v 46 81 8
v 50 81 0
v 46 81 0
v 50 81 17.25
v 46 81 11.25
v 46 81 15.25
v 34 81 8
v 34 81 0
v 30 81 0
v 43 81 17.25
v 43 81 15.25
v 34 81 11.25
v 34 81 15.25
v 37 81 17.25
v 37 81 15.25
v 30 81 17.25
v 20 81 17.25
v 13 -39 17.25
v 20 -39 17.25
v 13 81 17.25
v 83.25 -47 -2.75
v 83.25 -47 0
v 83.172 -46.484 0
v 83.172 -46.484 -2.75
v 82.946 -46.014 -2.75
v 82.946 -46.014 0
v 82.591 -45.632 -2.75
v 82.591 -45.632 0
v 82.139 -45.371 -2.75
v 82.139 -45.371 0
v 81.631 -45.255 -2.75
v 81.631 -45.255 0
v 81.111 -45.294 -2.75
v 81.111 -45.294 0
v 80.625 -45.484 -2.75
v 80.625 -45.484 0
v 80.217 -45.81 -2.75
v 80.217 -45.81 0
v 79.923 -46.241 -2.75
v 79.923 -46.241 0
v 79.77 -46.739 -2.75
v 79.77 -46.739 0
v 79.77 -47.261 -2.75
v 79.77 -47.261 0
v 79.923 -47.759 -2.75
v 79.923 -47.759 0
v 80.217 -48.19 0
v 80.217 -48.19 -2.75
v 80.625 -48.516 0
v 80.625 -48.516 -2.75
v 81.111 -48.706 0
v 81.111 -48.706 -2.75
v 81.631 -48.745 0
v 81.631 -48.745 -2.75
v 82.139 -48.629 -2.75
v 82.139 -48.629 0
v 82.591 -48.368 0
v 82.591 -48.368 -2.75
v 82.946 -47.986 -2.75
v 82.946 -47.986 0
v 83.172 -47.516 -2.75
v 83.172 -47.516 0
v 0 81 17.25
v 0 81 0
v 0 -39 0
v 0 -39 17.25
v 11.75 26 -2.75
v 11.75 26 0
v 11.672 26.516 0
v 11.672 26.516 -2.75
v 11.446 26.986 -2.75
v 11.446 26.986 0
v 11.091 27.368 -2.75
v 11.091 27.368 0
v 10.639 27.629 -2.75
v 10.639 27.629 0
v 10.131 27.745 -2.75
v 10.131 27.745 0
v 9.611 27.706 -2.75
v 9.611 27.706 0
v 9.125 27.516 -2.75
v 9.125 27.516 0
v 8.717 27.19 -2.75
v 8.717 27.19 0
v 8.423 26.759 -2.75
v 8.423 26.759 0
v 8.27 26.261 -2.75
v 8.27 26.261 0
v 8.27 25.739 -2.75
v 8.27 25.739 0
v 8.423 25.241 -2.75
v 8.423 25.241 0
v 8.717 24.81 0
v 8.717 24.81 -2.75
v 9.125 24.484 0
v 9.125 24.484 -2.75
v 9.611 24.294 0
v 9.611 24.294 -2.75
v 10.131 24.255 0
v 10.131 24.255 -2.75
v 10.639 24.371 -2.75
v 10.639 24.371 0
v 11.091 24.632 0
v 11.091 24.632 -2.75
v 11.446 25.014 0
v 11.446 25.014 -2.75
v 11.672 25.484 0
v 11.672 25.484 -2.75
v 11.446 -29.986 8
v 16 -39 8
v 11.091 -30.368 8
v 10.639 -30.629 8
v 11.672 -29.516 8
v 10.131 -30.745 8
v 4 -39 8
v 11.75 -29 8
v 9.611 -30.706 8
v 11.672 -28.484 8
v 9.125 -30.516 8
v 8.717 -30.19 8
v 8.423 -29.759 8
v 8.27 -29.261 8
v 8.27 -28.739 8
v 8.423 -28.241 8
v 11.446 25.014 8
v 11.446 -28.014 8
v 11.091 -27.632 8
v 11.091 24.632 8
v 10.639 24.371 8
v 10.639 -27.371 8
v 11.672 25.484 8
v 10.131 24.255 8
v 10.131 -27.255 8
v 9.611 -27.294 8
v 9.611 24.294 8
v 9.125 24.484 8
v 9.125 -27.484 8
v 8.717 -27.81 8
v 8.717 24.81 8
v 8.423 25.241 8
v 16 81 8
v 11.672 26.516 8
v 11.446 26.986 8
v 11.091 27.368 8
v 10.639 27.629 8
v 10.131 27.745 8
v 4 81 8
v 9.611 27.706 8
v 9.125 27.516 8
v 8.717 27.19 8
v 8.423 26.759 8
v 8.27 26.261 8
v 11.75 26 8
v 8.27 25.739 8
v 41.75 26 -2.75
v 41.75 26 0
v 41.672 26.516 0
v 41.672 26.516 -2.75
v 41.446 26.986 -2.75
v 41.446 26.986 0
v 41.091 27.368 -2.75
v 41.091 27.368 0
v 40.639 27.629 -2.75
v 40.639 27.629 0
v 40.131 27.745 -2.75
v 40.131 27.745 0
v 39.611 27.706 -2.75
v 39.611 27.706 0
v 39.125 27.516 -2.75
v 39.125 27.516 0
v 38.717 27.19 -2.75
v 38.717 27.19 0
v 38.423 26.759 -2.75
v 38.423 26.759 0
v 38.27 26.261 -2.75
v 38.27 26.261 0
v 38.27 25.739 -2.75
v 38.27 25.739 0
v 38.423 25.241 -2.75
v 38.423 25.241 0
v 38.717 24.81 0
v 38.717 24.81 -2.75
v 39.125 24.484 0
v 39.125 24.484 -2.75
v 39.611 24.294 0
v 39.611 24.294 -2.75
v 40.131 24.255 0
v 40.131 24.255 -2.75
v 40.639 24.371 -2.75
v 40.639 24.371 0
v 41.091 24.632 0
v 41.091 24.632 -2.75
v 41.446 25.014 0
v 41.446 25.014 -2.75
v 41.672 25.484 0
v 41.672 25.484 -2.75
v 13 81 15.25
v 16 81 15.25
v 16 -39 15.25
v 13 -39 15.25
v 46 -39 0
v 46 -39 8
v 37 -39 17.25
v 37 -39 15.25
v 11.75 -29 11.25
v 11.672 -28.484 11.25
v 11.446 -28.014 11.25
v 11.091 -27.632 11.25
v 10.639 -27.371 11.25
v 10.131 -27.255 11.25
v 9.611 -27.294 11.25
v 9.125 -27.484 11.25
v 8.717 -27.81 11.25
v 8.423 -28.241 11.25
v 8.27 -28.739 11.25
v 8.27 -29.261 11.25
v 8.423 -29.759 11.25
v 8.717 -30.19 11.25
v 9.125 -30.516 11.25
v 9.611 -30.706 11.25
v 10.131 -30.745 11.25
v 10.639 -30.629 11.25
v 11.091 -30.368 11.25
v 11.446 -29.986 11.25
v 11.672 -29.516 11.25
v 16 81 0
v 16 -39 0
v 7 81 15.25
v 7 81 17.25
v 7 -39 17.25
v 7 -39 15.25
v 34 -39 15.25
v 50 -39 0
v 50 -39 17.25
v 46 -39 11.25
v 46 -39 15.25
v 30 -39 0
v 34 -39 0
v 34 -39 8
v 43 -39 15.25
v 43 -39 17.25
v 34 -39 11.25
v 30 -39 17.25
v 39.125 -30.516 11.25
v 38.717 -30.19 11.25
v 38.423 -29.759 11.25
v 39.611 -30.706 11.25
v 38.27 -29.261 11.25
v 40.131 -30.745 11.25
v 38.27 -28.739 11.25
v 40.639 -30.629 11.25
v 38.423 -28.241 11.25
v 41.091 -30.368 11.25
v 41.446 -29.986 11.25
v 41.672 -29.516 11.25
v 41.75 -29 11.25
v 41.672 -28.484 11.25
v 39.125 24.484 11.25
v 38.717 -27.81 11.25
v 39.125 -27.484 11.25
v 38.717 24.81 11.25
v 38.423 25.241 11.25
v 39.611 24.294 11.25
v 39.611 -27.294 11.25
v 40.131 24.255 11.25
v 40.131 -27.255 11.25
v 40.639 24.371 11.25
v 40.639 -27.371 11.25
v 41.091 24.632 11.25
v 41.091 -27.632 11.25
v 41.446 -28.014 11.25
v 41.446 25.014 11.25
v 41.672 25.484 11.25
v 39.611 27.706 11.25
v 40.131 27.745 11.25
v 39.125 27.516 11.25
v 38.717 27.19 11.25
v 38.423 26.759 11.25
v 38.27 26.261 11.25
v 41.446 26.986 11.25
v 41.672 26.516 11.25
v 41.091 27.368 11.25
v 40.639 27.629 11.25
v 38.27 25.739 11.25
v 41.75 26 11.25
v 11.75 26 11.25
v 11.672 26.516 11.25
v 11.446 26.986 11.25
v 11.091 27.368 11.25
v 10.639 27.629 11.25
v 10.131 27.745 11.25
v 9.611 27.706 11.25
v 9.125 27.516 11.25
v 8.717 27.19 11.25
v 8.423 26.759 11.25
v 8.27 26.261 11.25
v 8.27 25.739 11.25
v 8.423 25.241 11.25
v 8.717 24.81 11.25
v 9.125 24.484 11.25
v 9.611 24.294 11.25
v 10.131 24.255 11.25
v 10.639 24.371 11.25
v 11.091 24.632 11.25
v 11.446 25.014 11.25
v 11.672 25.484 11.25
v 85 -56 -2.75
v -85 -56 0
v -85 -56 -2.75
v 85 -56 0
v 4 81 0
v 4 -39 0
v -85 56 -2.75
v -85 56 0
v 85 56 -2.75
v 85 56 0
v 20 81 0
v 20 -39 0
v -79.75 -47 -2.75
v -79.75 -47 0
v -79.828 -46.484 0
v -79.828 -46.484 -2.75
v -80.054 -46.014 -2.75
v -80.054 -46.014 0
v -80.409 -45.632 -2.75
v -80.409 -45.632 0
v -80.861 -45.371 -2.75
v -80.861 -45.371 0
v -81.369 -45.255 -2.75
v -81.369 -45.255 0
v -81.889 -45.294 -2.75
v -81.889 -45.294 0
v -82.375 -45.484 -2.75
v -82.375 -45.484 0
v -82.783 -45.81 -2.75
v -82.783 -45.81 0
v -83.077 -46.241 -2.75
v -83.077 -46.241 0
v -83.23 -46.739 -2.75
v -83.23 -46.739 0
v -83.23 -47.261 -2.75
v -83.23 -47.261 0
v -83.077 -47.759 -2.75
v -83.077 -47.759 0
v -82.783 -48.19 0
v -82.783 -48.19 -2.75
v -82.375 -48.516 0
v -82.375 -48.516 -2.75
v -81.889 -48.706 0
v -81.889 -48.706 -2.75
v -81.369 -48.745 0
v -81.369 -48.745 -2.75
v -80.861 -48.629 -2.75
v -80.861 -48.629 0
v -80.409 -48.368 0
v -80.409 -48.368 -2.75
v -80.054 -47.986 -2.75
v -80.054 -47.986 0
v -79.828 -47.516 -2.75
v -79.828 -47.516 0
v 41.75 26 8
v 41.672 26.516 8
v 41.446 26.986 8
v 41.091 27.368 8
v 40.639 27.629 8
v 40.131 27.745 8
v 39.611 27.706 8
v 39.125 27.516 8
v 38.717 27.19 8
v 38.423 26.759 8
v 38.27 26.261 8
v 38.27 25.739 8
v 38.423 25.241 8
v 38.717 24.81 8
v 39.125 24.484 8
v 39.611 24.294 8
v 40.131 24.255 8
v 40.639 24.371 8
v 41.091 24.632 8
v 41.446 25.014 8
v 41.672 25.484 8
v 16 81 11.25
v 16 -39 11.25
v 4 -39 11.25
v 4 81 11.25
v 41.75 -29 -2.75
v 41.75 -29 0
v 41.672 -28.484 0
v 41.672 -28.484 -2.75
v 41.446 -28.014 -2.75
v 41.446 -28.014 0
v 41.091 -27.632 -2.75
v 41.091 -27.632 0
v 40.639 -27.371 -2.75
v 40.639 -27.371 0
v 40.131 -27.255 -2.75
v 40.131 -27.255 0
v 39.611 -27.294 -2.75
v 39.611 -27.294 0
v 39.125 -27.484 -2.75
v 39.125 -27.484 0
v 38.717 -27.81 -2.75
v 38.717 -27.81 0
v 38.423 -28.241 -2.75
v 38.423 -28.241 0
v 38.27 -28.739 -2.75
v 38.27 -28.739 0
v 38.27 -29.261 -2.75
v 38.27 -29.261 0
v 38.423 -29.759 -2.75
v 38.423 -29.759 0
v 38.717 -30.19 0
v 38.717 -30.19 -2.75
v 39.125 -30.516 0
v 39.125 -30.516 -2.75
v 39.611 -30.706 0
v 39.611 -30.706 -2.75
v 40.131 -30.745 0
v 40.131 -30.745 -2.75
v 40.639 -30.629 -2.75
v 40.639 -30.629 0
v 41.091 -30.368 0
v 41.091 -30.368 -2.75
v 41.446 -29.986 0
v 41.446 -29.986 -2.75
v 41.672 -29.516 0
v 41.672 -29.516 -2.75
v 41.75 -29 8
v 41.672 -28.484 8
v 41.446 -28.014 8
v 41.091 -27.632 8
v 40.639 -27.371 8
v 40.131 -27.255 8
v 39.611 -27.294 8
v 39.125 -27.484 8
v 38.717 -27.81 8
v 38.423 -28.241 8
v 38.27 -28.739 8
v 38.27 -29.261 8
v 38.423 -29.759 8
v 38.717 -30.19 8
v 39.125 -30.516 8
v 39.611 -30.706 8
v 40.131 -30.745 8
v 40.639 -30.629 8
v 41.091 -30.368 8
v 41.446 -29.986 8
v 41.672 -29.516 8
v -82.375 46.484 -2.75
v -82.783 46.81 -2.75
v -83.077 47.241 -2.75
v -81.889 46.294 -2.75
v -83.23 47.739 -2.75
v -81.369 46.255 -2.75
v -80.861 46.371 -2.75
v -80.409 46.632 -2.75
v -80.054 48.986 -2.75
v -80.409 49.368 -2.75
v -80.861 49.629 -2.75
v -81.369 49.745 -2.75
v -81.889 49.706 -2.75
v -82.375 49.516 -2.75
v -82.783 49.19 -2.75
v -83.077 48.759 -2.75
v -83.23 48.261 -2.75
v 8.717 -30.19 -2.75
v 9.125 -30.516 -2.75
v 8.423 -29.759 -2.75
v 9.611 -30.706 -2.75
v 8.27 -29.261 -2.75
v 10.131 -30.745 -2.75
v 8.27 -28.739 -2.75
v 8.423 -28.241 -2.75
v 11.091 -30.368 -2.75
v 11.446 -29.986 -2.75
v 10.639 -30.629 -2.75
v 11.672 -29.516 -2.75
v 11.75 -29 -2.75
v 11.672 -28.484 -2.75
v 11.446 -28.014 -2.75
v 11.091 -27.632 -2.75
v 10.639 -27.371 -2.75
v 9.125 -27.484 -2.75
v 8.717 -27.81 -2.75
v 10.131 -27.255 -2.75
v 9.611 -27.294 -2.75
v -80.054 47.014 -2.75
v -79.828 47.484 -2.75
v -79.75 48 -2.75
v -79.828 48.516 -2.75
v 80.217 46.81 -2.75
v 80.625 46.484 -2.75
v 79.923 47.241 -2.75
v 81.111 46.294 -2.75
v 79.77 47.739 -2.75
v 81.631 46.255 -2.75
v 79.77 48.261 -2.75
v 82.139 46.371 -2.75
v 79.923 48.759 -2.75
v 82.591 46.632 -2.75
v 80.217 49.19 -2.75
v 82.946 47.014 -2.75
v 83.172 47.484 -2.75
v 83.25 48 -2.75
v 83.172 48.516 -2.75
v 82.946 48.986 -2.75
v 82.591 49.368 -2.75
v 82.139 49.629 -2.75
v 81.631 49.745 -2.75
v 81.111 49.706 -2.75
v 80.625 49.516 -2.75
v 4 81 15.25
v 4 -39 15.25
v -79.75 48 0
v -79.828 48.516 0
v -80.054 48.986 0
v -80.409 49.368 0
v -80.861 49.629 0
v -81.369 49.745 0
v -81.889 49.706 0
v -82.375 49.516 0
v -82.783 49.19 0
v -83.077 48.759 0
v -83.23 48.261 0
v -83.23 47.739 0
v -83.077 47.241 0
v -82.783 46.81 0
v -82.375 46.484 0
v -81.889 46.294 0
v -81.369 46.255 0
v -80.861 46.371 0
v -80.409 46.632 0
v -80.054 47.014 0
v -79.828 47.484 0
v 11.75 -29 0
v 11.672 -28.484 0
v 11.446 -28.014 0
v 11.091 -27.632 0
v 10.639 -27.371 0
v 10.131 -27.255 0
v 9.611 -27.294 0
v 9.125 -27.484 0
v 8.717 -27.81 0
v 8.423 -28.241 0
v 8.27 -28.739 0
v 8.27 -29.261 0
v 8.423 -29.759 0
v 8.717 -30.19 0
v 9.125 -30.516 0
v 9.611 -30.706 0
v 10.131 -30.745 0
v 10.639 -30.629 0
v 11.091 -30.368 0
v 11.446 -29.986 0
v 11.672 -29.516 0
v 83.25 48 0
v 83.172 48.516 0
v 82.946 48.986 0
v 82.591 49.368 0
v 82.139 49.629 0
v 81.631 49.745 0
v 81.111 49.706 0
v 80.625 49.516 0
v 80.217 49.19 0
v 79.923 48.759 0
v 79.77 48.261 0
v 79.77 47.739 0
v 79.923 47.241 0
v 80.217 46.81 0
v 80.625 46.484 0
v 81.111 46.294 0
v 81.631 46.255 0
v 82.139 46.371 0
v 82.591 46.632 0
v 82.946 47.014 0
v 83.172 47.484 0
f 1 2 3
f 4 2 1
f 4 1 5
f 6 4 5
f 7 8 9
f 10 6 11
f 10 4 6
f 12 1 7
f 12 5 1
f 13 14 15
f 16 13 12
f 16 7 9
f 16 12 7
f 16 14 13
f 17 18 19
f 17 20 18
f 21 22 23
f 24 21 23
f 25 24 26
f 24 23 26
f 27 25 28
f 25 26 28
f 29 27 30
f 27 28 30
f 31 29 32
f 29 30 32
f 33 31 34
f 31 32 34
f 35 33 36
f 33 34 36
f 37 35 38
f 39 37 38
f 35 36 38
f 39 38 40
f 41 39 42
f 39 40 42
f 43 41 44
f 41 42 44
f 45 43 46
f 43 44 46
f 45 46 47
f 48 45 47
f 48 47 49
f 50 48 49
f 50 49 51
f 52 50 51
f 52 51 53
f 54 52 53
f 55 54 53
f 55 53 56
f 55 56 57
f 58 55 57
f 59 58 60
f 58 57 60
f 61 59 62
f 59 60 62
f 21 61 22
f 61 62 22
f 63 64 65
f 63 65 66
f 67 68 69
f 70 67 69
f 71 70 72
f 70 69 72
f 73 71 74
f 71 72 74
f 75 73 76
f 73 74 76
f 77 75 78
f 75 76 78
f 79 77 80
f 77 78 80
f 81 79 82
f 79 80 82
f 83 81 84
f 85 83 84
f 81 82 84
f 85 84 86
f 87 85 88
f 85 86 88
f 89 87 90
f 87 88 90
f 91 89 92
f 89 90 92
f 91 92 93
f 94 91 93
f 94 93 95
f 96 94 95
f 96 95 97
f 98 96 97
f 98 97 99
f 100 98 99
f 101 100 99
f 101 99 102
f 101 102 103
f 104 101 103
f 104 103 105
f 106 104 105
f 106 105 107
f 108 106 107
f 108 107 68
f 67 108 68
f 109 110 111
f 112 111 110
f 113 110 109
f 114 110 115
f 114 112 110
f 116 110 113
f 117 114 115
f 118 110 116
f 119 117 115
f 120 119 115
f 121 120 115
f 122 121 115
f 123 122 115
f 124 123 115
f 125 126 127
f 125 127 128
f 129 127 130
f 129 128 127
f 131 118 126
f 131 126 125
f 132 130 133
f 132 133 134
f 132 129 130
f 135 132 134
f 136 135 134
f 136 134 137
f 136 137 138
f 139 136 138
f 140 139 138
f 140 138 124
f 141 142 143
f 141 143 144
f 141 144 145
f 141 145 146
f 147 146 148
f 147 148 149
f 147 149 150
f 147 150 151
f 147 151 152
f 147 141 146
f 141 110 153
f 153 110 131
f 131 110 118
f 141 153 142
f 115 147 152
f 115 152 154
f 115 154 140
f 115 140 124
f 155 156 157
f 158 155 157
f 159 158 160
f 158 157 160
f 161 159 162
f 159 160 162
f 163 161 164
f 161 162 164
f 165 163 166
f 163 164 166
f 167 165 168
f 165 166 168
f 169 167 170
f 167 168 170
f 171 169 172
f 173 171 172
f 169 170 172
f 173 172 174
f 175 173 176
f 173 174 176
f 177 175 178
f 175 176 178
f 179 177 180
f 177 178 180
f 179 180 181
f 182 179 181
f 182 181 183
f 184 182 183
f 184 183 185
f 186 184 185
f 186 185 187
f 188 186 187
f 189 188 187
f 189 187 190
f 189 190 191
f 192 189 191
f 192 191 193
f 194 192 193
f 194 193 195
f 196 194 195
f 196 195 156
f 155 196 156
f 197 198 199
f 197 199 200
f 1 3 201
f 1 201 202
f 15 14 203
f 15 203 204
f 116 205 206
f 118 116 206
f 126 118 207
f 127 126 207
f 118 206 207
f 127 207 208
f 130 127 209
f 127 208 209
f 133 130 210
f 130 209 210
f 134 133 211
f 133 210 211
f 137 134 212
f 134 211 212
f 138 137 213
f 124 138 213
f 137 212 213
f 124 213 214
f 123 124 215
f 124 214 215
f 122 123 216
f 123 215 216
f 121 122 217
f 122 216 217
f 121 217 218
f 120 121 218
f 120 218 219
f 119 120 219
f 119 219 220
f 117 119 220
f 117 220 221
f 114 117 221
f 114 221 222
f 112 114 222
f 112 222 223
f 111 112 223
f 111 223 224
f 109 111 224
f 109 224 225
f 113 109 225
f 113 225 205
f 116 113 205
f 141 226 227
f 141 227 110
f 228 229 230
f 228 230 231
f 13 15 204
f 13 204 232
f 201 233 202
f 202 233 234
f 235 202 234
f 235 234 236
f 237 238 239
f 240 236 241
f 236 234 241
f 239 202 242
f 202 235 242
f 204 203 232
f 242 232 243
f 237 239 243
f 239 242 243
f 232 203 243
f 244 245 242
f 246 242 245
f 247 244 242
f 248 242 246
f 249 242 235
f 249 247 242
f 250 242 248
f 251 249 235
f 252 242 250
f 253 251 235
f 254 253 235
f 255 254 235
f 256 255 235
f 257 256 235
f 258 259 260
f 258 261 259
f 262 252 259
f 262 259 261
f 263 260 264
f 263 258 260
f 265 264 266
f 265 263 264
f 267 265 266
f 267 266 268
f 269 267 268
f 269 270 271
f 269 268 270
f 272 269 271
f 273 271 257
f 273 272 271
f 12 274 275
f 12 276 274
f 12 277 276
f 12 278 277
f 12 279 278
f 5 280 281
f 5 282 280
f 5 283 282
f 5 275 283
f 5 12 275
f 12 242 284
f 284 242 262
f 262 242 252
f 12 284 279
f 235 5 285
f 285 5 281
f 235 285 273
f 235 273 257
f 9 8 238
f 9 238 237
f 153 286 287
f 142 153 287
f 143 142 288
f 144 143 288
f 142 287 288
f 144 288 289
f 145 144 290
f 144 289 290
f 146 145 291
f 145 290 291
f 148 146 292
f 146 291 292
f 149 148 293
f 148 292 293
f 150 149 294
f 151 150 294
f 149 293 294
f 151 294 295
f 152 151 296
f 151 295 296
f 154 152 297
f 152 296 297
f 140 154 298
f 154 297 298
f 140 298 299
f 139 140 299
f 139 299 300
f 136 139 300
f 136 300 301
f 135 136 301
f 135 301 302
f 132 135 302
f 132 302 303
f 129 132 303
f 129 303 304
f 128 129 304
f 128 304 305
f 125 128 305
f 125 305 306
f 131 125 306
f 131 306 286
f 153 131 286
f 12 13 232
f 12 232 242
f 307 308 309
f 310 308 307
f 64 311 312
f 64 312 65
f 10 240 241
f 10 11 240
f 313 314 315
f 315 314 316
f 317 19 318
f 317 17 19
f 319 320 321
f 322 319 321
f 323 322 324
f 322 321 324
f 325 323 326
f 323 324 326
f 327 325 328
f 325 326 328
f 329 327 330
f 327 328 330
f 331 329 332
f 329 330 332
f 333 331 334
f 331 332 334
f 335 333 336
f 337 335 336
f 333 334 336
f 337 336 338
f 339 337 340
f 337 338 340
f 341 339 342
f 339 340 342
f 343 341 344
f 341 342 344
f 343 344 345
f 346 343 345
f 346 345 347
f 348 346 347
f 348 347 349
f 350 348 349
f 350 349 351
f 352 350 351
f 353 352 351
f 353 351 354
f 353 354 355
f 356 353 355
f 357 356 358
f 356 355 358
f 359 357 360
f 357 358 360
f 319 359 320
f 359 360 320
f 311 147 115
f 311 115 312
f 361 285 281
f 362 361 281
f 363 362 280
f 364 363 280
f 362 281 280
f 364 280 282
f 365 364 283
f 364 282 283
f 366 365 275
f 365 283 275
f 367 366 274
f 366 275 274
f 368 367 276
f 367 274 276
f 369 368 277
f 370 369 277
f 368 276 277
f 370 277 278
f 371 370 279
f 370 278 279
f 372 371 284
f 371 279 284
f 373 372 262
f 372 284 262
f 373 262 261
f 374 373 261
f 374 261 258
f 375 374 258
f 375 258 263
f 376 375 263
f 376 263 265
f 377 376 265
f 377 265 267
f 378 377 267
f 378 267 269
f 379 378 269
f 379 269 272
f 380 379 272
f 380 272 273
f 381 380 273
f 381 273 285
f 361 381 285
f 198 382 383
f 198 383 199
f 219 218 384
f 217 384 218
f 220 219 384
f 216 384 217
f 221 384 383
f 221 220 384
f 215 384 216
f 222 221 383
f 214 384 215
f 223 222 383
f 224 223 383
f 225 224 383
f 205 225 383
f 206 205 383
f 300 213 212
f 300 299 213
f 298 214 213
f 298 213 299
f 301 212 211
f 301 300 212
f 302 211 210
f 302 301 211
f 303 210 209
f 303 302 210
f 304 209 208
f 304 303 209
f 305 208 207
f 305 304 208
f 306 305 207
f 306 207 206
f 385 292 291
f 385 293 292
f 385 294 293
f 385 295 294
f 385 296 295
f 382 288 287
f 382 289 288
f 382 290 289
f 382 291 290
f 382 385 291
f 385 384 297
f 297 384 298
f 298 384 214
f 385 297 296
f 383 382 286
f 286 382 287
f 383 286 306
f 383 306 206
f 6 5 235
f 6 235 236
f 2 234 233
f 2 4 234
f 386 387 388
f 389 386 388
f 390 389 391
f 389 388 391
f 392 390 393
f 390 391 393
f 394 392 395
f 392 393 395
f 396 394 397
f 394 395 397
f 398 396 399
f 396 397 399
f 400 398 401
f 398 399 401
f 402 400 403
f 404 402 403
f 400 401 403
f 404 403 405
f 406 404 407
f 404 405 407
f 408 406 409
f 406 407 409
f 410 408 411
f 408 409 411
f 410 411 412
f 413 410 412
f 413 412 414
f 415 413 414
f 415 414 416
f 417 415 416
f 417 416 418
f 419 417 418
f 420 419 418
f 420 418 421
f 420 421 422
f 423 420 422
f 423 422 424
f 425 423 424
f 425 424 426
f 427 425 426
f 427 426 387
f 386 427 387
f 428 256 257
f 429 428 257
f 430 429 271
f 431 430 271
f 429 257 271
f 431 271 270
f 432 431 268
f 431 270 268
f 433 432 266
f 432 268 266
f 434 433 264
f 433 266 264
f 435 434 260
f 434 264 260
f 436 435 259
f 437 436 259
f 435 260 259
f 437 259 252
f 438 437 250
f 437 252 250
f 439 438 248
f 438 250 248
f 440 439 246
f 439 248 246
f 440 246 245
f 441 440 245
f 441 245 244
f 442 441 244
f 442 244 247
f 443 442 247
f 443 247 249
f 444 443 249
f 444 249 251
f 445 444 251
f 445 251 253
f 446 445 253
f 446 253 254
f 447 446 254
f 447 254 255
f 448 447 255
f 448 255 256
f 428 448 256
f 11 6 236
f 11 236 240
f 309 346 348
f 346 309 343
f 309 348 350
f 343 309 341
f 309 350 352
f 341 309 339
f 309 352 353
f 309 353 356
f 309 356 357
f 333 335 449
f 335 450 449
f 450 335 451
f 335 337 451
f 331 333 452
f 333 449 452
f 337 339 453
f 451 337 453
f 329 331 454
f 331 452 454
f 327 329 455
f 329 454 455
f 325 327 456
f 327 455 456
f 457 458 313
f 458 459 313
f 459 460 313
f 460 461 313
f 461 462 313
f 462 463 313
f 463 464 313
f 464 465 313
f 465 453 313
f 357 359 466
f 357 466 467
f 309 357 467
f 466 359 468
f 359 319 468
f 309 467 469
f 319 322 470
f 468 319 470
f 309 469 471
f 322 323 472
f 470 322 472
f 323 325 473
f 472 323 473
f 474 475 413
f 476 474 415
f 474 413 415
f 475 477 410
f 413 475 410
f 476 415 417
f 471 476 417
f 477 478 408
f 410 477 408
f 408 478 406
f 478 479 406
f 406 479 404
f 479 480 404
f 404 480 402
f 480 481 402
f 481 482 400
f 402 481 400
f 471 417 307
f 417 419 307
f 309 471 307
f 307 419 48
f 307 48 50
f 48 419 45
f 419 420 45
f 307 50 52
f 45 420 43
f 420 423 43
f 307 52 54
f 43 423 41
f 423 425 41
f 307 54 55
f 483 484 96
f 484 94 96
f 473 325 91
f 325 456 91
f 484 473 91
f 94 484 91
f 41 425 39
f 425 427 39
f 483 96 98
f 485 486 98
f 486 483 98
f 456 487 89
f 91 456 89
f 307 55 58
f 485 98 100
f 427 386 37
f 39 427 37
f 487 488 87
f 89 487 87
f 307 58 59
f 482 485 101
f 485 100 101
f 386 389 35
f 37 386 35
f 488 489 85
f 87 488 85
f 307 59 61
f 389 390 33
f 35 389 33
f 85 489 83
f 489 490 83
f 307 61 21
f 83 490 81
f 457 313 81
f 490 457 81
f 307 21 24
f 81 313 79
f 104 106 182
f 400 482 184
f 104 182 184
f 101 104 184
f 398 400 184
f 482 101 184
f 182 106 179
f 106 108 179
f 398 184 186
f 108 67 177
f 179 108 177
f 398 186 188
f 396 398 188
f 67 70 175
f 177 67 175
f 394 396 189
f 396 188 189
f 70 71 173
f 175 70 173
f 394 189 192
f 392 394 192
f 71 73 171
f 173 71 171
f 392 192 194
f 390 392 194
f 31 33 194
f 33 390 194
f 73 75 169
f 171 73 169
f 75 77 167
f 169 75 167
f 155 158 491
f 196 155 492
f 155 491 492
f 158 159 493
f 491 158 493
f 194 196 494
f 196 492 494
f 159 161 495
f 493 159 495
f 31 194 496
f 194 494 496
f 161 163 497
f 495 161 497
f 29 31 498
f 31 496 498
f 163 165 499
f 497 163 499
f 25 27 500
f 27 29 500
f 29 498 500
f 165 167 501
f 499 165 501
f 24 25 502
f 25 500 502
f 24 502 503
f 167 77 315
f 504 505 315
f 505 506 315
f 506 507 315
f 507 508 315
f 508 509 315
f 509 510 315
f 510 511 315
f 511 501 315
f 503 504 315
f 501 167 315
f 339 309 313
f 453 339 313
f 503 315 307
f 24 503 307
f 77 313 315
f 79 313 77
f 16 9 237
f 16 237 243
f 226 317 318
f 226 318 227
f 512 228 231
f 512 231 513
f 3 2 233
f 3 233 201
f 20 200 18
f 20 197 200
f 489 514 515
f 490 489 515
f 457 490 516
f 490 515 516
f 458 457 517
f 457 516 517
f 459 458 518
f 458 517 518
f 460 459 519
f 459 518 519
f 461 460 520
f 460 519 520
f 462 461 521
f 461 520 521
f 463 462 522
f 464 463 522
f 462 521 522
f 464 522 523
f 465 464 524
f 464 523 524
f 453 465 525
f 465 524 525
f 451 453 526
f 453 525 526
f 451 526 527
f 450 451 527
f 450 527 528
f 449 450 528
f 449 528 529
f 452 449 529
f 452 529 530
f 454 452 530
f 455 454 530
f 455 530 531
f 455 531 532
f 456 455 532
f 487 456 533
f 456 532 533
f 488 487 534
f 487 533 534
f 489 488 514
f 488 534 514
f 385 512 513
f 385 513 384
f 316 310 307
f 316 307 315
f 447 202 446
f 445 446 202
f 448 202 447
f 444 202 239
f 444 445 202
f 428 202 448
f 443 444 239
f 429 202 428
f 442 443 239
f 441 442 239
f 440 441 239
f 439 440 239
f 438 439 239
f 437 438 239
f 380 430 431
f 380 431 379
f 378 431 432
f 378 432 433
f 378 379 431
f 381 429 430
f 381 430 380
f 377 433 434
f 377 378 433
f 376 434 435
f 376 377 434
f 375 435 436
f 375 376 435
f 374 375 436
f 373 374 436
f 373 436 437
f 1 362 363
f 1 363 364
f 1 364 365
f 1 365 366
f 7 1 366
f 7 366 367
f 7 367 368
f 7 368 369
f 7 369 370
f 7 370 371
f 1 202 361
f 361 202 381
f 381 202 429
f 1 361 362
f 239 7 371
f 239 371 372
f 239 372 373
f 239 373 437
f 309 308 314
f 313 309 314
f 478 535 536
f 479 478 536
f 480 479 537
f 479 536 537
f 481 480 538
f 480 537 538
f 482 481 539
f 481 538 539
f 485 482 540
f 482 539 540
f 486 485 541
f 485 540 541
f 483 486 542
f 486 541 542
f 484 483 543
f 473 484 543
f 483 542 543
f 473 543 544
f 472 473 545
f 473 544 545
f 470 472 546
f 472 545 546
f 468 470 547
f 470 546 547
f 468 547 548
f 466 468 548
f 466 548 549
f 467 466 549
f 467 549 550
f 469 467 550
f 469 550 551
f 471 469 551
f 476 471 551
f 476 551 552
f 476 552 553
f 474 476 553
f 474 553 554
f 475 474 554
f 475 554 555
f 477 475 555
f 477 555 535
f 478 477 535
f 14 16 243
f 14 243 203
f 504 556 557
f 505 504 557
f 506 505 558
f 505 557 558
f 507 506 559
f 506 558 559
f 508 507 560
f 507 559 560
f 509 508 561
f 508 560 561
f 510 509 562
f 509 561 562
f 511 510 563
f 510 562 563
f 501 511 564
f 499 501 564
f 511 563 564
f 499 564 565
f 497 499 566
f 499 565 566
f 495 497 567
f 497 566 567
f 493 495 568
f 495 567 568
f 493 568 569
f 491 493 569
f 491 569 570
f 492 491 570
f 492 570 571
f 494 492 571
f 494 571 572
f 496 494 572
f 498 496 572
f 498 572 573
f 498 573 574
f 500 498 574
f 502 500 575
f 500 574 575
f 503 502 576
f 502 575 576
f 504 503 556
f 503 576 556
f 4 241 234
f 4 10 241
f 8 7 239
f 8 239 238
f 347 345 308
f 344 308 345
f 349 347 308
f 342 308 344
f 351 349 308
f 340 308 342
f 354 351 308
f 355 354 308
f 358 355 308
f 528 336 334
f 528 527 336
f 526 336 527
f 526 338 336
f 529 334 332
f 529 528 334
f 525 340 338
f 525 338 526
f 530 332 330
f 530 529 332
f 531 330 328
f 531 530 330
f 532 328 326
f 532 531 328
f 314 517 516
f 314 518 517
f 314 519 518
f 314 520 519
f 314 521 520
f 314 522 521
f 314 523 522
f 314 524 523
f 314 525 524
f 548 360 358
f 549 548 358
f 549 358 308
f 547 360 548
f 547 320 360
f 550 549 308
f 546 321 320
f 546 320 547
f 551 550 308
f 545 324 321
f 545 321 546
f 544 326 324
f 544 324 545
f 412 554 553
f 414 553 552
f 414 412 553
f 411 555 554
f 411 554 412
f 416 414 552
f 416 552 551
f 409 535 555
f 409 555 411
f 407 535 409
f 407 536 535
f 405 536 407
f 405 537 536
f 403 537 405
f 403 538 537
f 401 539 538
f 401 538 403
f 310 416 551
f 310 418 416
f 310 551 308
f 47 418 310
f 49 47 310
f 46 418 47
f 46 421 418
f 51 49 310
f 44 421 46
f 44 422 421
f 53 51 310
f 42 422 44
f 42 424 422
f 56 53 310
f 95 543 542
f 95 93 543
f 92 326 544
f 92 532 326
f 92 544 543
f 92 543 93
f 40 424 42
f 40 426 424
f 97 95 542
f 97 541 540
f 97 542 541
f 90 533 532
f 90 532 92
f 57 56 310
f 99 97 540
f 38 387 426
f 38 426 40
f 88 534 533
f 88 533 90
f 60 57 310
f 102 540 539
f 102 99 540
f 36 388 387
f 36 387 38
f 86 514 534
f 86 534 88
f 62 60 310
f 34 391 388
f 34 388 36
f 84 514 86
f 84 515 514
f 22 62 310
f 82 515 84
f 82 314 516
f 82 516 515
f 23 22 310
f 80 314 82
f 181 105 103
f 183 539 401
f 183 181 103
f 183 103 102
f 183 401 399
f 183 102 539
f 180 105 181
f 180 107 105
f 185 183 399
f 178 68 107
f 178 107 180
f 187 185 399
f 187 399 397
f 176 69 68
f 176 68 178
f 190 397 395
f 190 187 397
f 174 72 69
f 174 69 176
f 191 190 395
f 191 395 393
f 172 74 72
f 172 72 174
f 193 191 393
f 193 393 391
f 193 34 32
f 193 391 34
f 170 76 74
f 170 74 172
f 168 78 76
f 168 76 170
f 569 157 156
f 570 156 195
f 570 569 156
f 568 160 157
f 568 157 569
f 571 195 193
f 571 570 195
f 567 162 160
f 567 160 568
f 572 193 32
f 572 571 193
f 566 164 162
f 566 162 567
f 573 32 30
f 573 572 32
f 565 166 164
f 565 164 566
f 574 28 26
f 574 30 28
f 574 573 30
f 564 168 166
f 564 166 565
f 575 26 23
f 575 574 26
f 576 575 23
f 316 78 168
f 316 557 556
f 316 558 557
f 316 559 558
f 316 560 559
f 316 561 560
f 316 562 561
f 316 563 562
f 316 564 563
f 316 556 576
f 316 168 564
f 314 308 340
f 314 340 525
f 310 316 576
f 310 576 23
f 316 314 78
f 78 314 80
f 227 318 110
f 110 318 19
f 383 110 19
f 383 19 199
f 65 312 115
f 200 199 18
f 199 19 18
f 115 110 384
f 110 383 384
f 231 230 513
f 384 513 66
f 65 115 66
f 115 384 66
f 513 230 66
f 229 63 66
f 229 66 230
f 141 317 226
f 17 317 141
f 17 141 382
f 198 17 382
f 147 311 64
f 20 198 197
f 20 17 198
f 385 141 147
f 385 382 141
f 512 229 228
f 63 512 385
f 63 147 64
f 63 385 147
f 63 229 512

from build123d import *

# Parameters (mm, degrees)
F0_W          = 170
F0_H          = 112
F1_DEPTH      = 2.75
F2_R          = 1.75
F3_DEPTH      = 2.75
F5_DEPTH      = 40
F5_DEPTH_BACK = 80
F6_R          = 1.75
F8_DEPTH      = 14.001


with BuildPart() as f1:
    # F0 (on Top) → F1 (new body)
    with BuildSketch(Plane.XY):
        Rectangle(F0_W, F0_H)
    extrude(amount=-F1_DEPTH)

    # F2 (on face) → F3 (cut, through all)
    with BuildSketch(Plane.XY):
        with Locations((-81.5, 48)):
            Circle(F2_R)
        with Locations((-81.5, -47)):
            Circle(F2_R)
        with Locations((81.5, 48)):
            Circle(F2_R)
        with Locations((81.5, -47)):
            Circle(F2_R)
    extrude(amount=-F3_DEPTH, mode=Mode.SUBTRACT)


with BuildPart() as f5:
    # F4 (on face) → F5 (new body, two sides)
    with BuildSketch(Plane(origin=(0, 56, 0), x_dir=(-1, 0, 0), z_dir=(0, 1, 0))) as f5_sk:
        Polygon((-50, 17.25), (-50, 0), (-46, 0), (-46, 8), (-34, 8), (-34, 0), (-30, 0), (-30, 17.25), (-37, 17.25), (-37, 15.25), (-34, 15.25), (-34, 11.25), (-46, 11.25), (-46, 15.25), (-43, 15.25), (-43, 17.25), align=None)
        Polygon((-20, 17.25), (-20, 0), (-16, 0), (-16, 8), (-4, 8), (-4, 0), (0, 0), (0, 17.25), (-7, 17.25), (-7, 15.25), (-4, 15.25), (-4, 11.25), (-16, 11.25), (-16, 15.25), (-13, 15.25), (-13, 17.25), align=None)
    extrude(amount=F5_DEPTH)
    extrude(f5_sk.sketch, amount=-F5_DEPTH_BACK)


with BuildPart() as f5_1:
    # F7: moved
    add(f5.part.moved(Location((0, -15, 0))))


with BuildPart() as f8_tool:
    # F6 (on face) → F8 (new body, through all)
    with BuildSketch(Plane.XY.offset(11.25)):
        with Locations((10, -29)):
            Circle(F6_R)
        with Locations((40, -29)):
            Circle(F6_R)
        with Locations((40, 26)):
            Circle(F6_R)
        with Locations((10, 26)):
            Circle(F6_R)
    extrude(amount=-F8_DEPTH)


with BuildPart() as f1_1:
    add(f1.part)

    # F8: cut by f8_tool
    add(f8_tool.part, mode=Mode.SUBTRACT)


with BuildPart() as f5_2:
    add(f5_1.part)

    # F8: cut by f8_tool
    add(f8_tool.part, mode=Mode.SUBTRACT)


solid = Compound([f1_1.part, f5_2.part])
